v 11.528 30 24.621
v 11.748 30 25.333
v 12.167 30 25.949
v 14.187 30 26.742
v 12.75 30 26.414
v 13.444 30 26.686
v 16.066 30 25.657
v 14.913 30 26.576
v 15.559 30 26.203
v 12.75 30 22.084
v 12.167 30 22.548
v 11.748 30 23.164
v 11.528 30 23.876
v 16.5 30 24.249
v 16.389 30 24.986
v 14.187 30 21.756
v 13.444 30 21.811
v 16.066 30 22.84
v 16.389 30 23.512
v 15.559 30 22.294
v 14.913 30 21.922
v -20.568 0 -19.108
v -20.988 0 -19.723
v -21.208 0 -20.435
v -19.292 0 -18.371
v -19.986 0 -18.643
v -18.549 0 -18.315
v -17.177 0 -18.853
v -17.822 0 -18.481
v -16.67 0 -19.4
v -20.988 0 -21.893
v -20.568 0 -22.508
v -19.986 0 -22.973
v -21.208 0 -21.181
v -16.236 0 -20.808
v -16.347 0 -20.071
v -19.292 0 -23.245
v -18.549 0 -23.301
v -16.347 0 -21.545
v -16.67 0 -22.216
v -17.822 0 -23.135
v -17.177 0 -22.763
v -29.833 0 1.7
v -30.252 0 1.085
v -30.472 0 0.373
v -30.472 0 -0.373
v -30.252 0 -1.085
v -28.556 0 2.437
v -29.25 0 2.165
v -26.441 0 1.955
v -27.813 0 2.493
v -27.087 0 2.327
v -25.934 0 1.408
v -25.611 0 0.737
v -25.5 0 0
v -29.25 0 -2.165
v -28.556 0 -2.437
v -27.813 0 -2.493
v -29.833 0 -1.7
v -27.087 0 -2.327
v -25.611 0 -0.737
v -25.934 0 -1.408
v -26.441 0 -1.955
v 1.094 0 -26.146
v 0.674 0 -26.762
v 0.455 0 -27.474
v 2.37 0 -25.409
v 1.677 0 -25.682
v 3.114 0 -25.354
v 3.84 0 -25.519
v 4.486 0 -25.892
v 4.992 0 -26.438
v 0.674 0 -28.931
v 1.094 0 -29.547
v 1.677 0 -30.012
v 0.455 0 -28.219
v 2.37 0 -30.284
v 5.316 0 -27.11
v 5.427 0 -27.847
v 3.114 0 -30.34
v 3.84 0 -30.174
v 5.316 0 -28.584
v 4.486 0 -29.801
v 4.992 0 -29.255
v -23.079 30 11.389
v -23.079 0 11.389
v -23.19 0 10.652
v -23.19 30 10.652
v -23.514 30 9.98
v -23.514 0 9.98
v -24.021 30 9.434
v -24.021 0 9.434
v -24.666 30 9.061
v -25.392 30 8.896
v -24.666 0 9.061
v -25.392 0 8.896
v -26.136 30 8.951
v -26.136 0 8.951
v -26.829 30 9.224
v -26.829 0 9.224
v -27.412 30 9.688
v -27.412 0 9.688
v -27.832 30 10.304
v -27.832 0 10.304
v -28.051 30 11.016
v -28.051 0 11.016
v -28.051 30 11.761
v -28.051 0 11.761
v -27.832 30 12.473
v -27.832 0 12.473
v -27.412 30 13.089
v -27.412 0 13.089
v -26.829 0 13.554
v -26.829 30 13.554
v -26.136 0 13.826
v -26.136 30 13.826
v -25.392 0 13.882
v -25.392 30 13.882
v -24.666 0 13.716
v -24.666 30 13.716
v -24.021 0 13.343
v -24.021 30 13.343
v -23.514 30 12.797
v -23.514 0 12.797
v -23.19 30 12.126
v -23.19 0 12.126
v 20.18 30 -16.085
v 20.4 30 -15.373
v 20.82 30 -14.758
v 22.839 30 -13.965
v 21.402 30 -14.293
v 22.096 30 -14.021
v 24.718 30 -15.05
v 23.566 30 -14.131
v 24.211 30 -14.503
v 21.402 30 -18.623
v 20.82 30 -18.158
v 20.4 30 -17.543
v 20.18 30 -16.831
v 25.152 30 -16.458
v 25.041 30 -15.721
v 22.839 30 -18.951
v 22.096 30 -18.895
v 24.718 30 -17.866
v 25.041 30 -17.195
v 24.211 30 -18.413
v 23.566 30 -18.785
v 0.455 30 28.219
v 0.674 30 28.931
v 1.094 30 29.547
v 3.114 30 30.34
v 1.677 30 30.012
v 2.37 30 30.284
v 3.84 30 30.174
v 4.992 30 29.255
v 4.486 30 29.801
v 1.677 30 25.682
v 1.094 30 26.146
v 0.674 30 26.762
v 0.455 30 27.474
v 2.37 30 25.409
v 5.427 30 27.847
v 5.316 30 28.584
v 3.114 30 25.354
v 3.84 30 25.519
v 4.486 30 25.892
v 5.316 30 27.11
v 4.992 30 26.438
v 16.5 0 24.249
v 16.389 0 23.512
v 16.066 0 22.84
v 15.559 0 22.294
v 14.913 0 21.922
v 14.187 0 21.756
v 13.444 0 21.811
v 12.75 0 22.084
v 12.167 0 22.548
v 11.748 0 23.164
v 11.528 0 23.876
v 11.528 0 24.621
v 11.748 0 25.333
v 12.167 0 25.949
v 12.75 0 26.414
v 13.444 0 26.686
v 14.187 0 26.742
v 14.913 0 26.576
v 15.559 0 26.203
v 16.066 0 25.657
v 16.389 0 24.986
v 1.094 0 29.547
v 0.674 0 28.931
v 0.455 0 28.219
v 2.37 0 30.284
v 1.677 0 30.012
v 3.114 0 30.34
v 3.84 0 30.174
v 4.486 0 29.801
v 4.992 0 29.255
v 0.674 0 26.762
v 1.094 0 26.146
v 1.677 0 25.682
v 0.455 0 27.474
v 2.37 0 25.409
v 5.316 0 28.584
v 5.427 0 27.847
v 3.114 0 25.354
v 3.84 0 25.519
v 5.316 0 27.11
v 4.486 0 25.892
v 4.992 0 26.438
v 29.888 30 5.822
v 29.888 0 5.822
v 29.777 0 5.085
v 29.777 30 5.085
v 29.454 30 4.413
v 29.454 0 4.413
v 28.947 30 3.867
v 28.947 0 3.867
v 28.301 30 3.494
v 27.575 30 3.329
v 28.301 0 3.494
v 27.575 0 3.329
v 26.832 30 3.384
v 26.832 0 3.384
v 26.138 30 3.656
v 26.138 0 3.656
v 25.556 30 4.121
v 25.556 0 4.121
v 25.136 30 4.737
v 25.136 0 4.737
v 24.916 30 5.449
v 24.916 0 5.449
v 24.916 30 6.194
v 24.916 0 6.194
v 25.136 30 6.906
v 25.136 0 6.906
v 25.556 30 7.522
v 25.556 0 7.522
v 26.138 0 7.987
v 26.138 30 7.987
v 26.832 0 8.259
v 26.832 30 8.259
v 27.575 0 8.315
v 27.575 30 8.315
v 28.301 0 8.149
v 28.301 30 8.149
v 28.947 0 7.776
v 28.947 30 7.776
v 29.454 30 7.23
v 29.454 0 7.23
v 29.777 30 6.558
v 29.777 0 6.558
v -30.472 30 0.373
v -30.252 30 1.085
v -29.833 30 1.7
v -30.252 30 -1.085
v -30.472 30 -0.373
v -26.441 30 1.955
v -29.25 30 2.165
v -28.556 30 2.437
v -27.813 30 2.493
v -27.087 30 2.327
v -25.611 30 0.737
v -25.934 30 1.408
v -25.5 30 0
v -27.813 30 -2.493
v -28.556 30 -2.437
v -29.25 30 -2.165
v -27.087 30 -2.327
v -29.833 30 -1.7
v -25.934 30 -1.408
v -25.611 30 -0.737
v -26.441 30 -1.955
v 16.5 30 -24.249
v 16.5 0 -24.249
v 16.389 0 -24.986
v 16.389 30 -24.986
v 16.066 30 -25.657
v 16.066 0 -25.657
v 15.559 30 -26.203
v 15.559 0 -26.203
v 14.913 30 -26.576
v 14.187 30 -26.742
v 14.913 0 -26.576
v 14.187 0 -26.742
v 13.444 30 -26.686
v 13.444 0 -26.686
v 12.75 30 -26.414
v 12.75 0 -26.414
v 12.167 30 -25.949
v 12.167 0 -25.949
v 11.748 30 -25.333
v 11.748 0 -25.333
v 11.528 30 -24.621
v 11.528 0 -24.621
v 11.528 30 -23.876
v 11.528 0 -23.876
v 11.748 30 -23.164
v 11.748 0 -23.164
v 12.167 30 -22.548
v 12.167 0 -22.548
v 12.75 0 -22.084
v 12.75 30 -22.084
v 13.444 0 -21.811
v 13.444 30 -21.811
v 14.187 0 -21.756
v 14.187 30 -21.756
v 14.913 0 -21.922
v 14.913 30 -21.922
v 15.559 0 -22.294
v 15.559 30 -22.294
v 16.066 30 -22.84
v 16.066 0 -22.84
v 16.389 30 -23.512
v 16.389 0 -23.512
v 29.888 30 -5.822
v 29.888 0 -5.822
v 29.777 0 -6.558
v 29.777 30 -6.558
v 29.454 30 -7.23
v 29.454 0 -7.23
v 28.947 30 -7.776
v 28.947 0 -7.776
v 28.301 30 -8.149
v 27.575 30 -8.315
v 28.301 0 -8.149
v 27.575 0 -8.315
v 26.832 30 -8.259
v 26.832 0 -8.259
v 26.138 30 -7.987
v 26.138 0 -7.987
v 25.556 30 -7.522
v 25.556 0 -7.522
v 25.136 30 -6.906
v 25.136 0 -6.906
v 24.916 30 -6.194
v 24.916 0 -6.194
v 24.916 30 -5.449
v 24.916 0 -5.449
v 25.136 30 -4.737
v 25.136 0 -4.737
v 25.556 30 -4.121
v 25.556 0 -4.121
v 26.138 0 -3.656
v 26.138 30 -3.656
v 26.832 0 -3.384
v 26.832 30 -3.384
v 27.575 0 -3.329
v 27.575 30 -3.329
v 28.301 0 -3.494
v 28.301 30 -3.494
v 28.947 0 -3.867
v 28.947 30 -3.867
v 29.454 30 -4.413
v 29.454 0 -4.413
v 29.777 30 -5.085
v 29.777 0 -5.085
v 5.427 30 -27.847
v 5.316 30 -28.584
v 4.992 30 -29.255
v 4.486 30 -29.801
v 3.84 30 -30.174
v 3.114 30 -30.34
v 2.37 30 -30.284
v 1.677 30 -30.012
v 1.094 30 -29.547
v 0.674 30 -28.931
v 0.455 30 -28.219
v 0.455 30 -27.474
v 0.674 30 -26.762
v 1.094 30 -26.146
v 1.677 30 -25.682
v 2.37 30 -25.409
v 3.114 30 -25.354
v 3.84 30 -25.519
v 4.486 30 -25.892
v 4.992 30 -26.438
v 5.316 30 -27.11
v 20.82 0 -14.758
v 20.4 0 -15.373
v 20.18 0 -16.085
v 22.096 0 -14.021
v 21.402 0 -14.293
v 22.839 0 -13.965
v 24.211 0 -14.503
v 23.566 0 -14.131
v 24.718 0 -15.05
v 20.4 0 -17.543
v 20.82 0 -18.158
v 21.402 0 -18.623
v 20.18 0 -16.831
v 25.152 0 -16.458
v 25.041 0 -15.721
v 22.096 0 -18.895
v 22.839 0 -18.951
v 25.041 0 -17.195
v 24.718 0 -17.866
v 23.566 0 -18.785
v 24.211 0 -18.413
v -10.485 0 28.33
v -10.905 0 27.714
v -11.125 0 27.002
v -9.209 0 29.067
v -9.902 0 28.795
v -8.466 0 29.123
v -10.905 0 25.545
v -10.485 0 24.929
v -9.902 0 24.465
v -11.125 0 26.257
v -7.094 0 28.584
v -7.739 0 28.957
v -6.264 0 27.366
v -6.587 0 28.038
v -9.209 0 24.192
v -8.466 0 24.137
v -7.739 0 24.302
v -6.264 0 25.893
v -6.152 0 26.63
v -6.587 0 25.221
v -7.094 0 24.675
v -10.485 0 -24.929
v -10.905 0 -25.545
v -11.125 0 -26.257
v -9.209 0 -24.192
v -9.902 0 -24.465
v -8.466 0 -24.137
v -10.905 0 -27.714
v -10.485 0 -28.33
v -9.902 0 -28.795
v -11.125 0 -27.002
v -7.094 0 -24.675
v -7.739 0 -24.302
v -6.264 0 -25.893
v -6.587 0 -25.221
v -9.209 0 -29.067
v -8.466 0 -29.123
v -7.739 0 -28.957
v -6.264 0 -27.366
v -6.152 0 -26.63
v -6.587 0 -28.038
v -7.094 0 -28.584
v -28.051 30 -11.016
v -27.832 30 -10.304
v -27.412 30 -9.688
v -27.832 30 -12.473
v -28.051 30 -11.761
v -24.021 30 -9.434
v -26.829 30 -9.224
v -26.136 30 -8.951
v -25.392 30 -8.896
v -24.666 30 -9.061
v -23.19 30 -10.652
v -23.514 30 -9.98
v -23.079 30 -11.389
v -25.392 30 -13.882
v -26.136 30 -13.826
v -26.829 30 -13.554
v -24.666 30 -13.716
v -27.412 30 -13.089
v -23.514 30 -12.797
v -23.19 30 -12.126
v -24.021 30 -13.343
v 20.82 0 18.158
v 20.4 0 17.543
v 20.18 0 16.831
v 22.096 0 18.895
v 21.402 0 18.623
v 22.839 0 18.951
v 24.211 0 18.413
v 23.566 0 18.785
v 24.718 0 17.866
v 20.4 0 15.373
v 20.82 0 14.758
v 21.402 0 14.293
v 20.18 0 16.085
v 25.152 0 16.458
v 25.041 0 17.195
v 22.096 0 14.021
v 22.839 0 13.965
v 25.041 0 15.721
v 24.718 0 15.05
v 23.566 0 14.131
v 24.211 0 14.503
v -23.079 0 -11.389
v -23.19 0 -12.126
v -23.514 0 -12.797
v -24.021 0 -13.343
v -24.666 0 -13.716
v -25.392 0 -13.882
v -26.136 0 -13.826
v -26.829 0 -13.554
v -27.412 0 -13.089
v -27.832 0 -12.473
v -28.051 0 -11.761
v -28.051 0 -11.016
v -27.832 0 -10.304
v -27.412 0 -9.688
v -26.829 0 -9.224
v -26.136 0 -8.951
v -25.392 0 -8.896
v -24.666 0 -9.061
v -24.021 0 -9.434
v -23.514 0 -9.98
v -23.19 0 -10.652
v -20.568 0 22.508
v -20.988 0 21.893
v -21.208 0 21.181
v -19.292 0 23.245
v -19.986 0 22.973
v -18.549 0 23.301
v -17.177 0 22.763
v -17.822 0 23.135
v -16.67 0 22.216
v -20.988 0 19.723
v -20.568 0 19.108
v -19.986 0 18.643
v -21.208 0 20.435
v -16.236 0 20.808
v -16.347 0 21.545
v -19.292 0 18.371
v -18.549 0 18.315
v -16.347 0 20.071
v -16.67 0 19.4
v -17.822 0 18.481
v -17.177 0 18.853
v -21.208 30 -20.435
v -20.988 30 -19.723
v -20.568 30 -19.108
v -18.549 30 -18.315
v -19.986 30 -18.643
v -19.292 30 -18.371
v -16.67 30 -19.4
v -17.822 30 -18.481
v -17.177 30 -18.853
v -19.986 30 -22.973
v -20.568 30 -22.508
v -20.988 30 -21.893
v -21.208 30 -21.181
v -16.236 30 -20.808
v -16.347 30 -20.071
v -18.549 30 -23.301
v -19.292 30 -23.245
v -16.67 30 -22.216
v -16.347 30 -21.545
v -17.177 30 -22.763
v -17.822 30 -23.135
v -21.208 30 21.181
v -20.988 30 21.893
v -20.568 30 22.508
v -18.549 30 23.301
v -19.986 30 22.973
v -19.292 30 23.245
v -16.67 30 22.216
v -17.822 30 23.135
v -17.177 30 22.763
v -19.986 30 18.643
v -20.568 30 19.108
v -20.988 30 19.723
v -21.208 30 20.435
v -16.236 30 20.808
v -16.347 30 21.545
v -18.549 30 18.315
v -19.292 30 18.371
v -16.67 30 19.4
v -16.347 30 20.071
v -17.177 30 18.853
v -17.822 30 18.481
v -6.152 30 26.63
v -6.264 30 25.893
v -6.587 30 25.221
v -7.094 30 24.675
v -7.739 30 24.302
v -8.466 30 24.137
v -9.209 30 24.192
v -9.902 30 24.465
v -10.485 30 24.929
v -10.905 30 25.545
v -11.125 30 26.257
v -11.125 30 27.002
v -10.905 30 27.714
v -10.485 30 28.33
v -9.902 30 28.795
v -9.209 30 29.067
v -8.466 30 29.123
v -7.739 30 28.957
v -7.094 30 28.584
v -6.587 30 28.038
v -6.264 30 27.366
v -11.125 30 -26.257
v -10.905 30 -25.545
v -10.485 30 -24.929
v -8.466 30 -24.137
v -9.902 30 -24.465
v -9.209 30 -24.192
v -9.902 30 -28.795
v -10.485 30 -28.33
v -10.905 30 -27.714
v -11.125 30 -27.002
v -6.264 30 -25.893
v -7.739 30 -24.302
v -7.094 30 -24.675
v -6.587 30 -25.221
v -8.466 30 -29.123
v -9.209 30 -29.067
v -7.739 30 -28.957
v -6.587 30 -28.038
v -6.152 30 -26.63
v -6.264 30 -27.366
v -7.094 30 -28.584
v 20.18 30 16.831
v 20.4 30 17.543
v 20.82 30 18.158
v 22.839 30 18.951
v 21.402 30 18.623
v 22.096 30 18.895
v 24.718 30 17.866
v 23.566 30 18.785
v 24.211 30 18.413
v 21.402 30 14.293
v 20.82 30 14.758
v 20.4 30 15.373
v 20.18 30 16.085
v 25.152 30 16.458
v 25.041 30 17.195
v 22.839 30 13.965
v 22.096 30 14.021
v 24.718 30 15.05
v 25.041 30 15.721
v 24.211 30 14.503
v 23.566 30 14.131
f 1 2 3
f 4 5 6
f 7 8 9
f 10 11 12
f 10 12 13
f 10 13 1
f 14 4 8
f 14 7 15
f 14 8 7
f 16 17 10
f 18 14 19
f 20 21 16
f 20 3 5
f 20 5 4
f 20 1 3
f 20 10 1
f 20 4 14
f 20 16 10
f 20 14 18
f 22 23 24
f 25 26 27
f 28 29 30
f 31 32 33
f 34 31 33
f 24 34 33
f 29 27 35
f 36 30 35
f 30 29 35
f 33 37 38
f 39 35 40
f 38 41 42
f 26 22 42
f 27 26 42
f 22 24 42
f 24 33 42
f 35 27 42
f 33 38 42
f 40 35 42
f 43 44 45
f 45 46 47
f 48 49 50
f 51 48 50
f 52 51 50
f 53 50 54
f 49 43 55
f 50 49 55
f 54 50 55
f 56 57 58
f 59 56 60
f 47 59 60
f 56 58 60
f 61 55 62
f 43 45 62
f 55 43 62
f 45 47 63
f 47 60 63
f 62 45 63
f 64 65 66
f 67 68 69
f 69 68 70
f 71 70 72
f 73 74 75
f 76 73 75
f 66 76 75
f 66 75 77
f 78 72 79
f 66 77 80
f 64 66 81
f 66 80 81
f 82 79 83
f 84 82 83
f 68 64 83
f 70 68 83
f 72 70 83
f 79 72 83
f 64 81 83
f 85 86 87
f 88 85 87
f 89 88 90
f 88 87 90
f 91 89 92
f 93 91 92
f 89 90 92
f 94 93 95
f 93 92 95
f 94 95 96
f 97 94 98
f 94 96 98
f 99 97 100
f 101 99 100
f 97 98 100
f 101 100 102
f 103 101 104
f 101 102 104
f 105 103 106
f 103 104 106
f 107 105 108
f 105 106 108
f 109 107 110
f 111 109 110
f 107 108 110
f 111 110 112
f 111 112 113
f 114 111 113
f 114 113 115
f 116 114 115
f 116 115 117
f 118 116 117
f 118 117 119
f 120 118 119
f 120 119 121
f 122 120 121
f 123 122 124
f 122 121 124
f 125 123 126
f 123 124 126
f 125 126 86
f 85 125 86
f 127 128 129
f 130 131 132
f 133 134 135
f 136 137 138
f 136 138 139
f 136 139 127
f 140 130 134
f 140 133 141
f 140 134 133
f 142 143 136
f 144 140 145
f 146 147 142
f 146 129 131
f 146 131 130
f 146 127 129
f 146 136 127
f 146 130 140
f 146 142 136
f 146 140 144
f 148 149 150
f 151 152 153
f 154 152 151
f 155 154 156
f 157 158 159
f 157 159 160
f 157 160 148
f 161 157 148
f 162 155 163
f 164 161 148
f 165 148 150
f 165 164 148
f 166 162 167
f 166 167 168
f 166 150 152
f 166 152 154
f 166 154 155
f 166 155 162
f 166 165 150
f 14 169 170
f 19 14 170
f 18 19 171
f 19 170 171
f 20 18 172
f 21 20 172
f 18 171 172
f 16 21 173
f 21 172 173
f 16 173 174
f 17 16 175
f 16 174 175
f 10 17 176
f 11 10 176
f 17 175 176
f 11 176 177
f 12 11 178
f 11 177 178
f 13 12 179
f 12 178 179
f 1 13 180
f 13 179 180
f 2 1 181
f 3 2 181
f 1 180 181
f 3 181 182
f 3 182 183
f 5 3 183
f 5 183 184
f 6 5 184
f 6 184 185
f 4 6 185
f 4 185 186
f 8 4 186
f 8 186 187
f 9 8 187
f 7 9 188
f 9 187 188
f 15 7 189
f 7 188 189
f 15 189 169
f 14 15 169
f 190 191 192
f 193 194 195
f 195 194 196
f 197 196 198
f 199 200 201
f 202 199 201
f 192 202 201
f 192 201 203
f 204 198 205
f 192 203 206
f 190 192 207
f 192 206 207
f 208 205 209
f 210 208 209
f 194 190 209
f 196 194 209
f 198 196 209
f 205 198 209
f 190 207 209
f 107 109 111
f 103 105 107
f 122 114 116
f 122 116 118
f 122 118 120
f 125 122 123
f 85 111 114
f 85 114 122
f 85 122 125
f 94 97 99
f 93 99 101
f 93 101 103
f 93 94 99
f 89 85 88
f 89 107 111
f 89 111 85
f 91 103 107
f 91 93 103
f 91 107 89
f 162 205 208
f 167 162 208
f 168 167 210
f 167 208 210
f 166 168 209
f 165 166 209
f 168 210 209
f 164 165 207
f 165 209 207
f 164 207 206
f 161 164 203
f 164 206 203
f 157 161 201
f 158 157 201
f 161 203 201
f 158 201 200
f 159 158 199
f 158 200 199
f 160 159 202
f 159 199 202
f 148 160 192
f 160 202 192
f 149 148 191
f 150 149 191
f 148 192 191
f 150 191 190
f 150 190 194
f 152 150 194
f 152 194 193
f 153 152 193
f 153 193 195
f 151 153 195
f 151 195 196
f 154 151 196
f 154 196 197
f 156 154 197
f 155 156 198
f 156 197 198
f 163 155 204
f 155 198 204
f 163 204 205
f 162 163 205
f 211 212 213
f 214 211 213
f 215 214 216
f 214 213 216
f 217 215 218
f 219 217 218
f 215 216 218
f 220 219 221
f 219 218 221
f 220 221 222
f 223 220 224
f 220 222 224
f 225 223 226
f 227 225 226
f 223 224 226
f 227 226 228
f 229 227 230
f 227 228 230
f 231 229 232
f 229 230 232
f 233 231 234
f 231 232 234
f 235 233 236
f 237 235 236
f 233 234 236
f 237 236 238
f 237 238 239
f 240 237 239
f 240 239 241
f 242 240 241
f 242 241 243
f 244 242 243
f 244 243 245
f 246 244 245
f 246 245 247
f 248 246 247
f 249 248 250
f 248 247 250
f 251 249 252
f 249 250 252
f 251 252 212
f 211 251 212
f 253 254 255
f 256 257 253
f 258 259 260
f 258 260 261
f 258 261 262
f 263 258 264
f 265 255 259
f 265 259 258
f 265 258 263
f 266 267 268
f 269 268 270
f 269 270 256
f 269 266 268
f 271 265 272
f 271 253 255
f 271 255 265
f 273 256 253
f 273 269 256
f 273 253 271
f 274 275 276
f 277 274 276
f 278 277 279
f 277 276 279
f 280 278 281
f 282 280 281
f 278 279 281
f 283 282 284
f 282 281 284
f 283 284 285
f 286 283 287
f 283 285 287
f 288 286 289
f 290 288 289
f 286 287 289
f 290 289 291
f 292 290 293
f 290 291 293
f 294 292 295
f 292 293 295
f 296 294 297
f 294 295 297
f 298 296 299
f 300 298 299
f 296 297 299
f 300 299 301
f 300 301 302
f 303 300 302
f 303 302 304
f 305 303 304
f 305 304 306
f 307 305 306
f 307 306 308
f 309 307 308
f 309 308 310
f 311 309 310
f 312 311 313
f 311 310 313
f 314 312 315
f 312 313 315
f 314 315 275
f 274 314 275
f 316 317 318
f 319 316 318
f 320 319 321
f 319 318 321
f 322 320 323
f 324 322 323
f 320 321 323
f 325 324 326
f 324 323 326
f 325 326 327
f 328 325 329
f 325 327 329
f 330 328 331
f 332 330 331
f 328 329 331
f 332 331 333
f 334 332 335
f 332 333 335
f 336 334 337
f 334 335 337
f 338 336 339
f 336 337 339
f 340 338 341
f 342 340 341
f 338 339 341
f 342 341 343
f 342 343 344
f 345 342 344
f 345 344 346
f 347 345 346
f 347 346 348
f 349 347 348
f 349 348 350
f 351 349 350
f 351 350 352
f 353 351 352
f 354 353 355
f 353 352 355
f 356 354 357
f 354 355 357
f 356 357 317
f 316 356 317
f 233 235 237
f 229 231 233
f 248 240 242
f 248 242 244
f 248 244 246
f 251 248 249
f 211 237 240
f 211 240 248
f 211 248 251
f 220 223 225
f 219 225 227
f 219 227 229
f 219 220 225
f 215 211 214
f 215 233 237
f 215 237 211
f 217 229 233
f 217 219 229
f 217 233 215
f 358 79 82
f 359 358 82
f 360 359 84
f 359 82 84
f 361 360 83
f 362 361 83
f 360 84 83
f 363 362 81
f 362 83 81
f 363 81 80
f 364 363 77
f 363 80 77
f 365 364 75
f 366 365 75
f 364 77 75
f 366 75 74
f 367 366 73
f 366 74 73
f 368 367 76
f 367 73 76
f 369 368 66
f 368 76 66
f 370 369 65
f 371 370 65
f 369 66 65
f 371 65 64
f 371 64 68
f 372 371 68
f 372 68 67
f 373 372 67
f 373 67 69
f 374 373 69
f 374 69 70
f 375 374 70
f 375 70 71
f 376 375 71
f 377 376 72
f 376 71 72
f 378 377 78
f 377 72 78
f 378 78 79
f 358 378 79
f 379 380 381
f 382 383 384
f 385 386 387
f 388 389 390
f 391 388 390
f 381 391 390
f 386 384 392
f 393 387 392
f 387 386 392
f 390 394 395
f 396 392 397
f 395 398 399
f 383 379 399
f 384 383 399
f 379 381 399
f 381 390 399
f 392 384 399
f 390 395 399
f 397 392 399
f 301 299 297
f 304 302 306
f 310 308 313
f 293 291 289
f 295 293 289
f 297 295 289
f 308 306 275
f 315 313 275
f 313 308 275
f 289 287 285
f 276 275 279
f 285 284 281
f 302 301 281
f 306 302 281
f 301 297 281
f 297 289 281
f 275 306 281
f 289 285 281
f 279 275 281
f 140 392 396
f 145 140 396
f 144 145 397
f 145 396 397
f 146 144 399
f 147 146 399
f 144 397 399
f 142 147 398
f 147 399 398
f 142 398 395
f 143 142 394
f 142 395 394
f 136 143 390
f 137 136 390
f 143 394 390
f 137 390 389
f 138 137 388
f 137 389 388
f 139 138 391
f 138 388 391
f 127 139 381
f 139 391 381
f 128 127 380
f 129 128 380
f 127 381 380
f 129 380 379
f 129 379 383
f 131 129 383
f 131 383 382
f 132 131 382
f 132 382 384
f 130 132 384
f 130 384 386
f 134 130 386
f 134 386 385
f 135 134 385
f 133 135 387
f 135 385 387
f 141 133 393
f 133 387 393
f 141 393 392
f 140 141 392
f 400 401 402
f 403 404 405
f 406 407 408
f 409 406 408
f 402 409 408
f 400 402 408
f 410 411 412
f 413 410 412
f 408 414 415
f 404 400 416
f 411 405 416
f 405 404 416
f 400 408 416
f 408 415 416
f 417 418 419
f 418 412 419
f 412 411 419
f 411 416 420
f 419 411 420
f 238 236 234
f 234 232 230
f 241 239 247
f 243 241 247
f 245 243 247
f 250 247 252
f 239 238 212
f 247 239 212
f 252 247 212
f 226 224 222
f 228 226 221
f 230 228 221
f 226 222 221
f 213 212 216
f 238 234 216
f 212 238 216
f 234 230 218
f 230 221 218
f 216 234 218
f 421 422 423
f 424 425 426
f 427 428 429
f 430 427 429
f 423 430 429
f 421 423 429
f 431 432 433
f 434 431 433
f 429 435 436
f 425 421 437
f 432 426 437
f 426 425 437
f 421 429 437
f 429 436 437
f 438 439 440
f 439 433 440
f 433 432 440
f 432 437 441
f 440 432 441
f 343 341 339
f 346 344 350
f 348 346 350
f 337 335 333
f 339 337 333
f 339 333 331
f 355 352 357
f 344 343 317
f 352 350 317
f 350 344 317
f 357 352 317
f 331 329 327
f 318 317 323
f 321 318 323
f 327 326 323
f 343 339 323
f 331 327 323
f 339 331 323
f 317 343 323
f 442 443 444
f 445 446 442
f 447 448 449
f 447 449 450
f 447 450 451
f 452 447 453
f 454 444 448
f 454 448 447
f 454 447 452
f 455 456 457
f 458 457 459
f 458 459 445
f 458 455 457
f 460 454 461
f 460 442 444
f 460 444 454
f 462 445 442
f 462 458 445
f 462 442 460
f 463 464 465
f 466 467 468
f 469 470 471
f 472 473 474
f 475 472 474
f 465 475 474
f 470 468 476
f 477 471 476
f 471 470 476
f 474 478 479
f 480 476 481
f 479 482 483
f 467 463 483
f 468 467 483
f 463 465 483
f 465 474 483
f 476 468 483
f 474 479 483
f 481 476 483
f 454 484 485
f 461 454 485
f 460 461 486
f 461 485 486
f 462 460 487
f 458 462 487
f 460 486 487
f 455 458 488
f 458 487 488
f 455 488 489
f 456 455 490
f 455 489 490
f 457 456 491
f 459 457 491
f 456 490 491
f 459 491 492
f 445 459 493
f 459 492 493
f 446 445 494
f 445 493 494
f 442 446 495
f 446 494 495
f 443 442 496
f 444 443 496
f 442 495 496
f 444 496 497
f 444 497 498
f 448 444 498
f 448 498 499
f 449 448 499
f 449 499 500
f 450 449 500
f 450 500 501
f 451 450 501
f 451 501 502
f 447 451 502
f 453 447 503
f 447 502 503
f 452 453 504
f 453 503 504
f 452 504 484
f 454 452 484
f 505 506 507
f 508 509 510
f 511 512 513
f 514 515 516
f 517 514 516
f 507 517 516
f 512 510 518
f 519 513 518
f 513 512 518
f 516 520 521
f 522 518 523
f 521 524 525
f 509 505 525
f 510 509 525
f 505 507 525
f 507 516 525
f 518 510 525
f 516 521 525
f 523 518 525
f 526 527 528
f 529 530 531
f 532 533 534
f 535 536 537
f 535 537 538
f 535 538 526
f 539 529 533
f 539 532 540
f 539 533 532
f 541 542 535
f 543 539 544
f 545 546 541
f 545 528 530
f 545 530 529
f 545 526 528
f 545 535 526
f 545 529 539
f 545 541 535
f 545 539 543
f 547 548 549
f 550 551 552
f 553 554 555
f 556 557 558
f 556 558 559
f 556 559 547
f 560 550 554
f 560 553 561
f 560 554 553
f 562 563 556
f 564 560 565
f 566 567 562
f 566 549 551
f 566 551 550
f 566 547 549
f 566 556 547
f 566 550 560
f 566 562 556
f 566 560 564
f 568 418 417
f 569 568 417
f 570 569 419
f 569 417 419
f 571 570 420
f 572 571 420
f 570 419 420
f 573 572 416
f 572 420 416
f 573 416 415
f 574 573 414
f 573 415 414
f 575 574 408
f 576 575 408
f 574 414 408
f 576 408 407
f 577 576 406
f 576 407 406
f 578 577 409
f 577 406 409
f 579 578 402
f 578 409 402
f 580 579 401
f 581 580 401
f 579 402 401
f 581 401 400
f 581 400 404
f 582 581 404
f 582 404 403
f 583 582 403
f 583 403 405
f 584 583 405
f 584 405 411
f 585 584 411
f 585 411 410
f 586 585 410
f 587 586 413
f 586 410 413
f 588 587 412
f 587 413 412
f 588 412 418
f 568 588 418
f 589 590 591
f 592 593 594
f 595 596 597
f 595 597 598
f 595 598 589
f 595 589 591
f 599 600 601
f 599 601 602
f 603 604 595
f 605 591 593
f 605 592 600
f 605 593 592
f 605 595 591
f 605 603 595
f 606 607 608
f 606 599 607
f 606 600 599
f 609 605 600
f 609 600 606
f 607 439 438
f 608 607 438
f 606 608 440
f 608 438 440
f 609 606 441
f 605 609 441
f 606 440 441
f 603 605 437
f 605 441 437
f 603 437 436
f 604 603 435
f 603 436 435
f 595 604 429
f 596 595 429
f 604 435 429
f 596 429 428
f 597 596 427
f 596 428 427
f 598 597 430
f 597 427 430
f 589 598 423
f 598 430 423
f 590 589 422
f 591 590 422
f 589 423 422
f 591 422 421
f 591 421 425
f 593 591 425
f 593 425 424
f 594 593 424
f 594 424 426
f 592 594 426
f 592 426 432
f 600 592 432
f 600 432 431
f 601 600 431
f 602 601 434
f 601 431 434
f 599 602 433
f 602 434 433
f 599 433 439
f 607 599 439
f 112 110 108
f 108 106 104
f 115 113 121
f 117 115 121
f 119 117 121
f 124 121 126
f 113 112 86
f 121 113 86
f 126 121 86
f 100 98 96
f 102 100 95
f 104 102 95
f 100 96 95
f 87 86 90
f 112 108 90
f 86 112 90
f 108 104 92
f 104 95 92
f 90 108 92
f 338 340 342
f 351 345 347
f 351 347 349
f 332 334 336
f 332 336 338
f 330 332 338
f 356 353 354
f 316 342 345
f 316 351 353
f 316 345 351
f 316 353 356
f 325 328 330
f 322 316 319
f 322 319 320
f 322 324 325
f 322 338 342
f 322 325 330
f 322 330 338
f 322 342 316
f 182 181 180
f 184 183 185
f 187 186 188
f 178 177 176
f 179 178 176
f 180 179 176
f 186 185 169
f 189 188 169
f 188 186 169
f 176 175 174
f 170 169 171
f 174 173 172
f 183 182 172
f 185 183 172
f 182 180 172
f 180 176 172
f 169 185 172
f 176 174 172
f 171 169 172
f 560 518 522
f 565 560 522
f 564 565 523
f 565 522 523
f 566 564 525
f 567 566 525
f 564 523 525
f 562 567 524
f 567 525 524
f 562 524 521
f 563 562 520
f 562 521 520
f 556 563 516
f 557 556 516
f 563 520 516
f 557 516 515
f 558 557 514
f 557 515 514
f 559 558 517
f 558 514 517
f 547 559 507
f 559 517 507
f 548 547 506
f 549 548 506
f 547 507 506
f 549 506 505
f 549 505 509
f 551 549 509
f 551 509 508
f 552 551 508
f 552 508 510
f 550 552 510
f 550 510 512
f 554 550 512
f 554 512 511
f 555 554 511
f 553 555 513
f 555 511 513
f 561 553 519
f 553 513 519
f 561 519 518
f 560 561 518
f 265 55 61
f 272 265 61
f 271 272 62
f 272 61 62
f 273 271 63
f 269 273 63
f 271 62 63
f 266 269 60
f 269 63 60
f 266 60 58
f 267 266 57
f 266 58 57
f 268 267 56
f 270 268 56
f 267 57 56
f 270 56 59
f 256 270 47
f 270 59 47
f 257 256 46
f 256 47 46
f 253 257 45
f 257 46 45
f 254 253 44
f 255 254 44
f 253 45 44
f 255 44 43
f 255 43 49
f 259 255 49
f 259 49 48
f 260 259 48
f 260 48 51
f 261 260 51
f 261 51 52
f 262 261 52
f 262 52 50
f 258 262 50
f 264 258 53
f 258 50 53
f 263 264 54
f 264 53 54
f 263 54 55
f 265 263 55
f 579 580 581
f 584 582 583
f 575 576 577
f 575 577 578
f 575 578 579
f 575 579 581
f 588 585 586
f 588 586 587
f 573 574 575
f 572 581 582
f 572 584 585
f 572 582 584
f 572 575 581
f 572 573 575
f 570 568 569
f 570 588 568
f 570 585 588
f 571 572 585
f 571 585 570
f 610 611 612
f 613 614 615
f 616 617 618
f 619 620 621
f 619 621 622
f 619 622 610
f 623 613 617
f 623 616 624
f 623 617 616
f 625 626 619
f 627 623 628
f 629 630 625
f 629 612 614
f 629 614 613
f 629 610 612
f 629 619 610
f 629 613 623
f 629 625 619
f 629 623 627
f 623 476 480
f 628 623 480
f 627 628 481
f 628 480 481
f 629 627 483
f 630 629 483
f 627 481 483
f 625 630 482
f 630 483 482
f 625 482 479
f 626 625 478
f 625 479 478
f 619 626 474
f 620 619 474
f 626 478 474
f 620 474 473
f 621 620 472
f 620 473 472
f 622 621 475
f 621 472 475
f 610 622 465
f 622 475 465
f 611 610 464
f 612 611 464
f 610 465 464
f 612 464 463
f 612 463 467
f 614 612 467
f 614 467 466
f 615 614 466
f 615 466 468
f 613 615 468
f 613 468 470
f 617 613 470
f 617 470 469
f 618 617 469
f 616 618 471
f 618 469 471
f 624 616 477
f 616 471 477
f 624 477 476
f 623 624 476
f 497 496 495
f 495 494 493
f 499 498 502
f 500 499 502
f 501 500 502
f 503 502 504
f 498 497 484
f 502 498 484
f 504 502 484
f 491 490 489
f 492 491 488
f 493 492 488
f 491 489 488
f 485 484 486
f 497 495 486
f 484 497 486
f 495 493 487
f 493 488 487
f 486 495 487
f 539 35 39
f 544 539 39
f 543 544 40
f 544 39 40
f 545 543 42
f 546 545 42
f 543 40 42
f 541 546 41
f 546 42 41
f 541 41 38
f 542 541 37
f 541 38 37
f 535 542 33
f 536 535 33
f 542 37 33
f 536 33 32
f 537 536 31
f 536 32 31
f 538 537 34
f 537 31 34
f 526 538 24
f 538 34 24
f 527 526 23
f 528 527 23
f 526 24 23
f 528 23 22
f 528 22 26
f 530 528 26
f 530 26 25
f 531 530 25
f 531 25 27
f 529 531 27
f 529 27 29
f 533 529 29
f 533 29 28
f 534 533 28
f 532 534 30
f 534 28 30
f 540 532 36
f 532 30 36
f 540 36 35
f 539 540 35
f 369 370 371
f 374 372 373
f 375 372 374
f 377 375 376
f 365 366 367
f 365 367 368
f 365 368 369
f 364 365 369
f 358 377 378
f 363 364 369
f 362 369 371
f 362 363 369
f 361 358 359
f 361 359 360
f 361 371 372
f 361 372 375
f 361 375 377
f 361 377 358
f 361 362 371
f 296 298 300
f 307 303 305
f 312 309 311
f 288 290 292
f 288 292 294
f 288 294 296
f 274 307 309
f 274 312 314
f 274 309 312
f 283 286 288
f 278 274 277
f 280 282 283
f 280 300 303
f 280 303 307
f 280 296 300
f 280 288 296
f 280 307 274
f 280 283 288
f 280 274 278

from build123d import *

# Parameters (mm, degrees)
SKETCH1_R              = 2.5
BOSS_EXTRUDE1_DEPTH    = 30
BOSS_EXTRUDE1_2_DEPTH  = 30
BOSS_EXTRUDE1_3_DEPTH  = 30
BOSS_EXTRUDE1_4_DEPTH  = 30
BOSS_EXTRUDE1_5_DEPTH  = 30
BOSS_EXTRUDE1_6_DEPTH  = 30
BOSS_EXTRUDE1_7_DEPTH  = 30
BOSS_EXTRUDE1_8_DEPTH  = 30
BOSS_EXTRUDE1_9_DEPTH  = 30
BOSS_EXTRUDE1_10_DEPTH = 30
BOSS_EXTRUDE1_11_DEPTH = 30
BOSS_EXTRUDE1_12_DEPTH = 30
BOSS_EXTRUDE1_13_DEPTH = 30
BOSS_EXTRUDE1_14_DEPTH = 30
BOSS_EXTRUDE1_15_DEPTH = 30


with BuildPart() as part:
    # Sketch1 → Boss-Extrude1 (new body)
    with BuildSketch(Plane(origin=(0, 0, 0), x_dir=(1, 0, 0), z_dir=(0, 1, 0))):
        with Locations((27.388132821, 5.821527343)):
            Circle(SKETCH1_R)
    extrude(amount=BOSS_EXTRUDE1_DEPTH)


with BuildPart() as body_2:
    # Sketch1 → Boss-Extrude1 2 (new body)
    with BuildSketch(Plane(origin=(0, 0, 0), x_dir=(1, 0, 0), z_dir=(0, 1, 0))):
        with Locations((27.388132821, -5.821527343)):
            Circle(SKETCH1_R)
    extrude(amount=BOSS_EXTRUDE1_2_DEPTH)


with BuildPart() as body_3:
    # Sketch1 → Boss-Extrude1 3 (new body)
    with BuildSketch(Plane(origin=(0, 0, 0), x_dir=(1, 0, 0), z_dir=(0, 1, 0))):
        with Locations((22.652475842, -16.457987064)):
            Circle(SKETCH1_R)
    extrude(amount=BOSS_EXTRUDE1_3_DEPTH)


with BuildPart() as body_4:
    # Sketch1 → Boss-Extrude1 4 (new body)
    with BuildSketch(Plane(origin=(0, 0, 0), x_dir=(1, 0, 0), z_dir=(0, 1, 0))):
        with Locations((14, -24.248711306)):
            Circle(SKETCH1_R)
    extrude(amount=BOSS_EXTRUDE1_4_DEPTH)


with BuildPart() as body_5:
    # Sketch1 → Boss-Extrude1 5 (new body)
    with BuildSketch(Plane(origin=(0, 0, 0), x_dir=(1, 0, 0), z_dir=(0, 1, 0))):
        with Locations((2.926796971, -27.84661307)):
            Circle(SKETCH1_R)
    extrude(amount=BOSS_EXTRUDE1_5_DEPTH)


with BuildPart() as body_6:
    # Sketch1 → Boss-Extrude1 6 (new body)
    with BuildSketch(Plane(origin=(0, 0, 0), x_dir=(1, 0, 0), z_dir=(0, 1, 0))):
        with Locations((-8.652475842, -26.629582456)):
            Circle(SKETCH1_R)
    extrude(amount=BOSS_EXTRUDE1_6_DEPTH)


with BuildPart() as body_7:
    # Sketch1 → Boss-Extrude1 7 (new body)
    with BuildSketch(Plane(origin=(0, 0, 0), x_dir=(1, 0, 0), z_dir=(0, 1, 0))):
        with Locations((-18.735656978, -20.808055113)):
            Circle(SKETCH1_R)
    extrude(amount=BOSS_EXTRUDE1_7_DEPTH)


with BuildPart() as body_8:
    # Sketch1 → Boss-Extrude1 8 (new body)
    with BuildSketch(Plane(origin=(0, 0, 0), x_dir=(1, 0, 0), z_dir=(0, 1, 0))):
        with Locations((-25.579272814, -11.388626006)):
            Circle(SKETCH1_R)
    extrude(amount=BOSS_EXTRUDE1_8_DEPTH)


with BuildPart() as body_9:
    # Sketch1 → Boss-Extrude1 9 (new body)
    with BuildSketch(Plane(origin=(0, 0, 0), x_dir=(1, 0, 0), z_dir=(0, 1, 0))):
        with Locations((-28, 0)):
            Circle(SKETCH1_R)
    extrude(amount=BOSS_EXTRUDE1_9_DEPTH)


with BuildPart() as body_10:
    # Sketch1 → Boss-Extrude1 10 (new body)
    with BuildSketch(Plane(origin=(0, 0, 0), x_dir=(1, 0, 0), z_dir=(0, 1, 0))):
        with Locations((-25.579272814, 11.388626006)):
            Circle(SKETCH1_R)
    extrude(amount=BOSS_EXTRUDE1_10_DEPTH)


with BuildPart() as body_11:
    # Sketch1 → Boss-Extrude1 11 (new body)
    with BuildSketch(Plane(origin=(0, 0, 0), x_dir=(1, 0, 0), z_dir=(0, 1, 0))):
        with Locations((-18.735656978, 20.808055113)):
            Circle(SKETCH1_R)
    extrude(amount=BOSS_EXTRUDE1_11_DEPTH)


with BuildPart() as body_12:
    # Sketch1 → Boss-Extrude1 12 (new body)
    with BuildSketch(Plane(origin=(0, 0, 0), x_dir=(1, 0, 0), z_dir=(0, 1, 0))):
        with Locations((-8.652475842, 26.629582456)):
            Circle(SKETCH1_R)
    extrude(amount=BOSS_EXTRUDE1_12_DEPTH)


with BuildPart() as body_13:
    # Sketch1 → Boss-Extrude1 13 (new body)
    with BuildSketch(Plane(origin=(0, 0, 0), x_dir=(1, 0, 0), z_dir=(0, 1, 0))):
        with Locations((2.926796971, 27.84661307)):
            Circle(SKETCH1_R)
    extrude(amount=BOSS_EXTRUDE1_13_DEPTH)


with BuildPart() as body_14:
    # Sketch1 → Boss-Extrude1 14 (new body)
    with BuildSketch(Plane(origin=(0, 0, 0), x_dir=(1, 0, 0), z_dir=(0, 1, 0))):
        with Locations((14, 24.248711306)):
            Circle(SKETCH1_R)
    extrude(amount=BOSS_EXTRUDE1_14_DEPTH)


with BuildPart() as body_15:
    # Sketch1 → Boss-Extrude1 15 (new body)
    with BuildSketch(Plane(origin=(0, 0, 0), x_dir=(1, 0, 0), z_dir=(0, 1, 0))):
        with Locations((22.652475842, 16.457987064)):
            Circle(SKETCH1_R)
    extrude(amount=BOSS_EXTRUDE1_15_DEPTH)


solid = Compound([part.part, body_2.part, body_3.part, body_4.part, body_5.part, body_6.part, body_7.part, body_8.part, body_9.part, body_10.part, body_11.part, body_12.part, body_13.part, body_14.part, body_15.part])
